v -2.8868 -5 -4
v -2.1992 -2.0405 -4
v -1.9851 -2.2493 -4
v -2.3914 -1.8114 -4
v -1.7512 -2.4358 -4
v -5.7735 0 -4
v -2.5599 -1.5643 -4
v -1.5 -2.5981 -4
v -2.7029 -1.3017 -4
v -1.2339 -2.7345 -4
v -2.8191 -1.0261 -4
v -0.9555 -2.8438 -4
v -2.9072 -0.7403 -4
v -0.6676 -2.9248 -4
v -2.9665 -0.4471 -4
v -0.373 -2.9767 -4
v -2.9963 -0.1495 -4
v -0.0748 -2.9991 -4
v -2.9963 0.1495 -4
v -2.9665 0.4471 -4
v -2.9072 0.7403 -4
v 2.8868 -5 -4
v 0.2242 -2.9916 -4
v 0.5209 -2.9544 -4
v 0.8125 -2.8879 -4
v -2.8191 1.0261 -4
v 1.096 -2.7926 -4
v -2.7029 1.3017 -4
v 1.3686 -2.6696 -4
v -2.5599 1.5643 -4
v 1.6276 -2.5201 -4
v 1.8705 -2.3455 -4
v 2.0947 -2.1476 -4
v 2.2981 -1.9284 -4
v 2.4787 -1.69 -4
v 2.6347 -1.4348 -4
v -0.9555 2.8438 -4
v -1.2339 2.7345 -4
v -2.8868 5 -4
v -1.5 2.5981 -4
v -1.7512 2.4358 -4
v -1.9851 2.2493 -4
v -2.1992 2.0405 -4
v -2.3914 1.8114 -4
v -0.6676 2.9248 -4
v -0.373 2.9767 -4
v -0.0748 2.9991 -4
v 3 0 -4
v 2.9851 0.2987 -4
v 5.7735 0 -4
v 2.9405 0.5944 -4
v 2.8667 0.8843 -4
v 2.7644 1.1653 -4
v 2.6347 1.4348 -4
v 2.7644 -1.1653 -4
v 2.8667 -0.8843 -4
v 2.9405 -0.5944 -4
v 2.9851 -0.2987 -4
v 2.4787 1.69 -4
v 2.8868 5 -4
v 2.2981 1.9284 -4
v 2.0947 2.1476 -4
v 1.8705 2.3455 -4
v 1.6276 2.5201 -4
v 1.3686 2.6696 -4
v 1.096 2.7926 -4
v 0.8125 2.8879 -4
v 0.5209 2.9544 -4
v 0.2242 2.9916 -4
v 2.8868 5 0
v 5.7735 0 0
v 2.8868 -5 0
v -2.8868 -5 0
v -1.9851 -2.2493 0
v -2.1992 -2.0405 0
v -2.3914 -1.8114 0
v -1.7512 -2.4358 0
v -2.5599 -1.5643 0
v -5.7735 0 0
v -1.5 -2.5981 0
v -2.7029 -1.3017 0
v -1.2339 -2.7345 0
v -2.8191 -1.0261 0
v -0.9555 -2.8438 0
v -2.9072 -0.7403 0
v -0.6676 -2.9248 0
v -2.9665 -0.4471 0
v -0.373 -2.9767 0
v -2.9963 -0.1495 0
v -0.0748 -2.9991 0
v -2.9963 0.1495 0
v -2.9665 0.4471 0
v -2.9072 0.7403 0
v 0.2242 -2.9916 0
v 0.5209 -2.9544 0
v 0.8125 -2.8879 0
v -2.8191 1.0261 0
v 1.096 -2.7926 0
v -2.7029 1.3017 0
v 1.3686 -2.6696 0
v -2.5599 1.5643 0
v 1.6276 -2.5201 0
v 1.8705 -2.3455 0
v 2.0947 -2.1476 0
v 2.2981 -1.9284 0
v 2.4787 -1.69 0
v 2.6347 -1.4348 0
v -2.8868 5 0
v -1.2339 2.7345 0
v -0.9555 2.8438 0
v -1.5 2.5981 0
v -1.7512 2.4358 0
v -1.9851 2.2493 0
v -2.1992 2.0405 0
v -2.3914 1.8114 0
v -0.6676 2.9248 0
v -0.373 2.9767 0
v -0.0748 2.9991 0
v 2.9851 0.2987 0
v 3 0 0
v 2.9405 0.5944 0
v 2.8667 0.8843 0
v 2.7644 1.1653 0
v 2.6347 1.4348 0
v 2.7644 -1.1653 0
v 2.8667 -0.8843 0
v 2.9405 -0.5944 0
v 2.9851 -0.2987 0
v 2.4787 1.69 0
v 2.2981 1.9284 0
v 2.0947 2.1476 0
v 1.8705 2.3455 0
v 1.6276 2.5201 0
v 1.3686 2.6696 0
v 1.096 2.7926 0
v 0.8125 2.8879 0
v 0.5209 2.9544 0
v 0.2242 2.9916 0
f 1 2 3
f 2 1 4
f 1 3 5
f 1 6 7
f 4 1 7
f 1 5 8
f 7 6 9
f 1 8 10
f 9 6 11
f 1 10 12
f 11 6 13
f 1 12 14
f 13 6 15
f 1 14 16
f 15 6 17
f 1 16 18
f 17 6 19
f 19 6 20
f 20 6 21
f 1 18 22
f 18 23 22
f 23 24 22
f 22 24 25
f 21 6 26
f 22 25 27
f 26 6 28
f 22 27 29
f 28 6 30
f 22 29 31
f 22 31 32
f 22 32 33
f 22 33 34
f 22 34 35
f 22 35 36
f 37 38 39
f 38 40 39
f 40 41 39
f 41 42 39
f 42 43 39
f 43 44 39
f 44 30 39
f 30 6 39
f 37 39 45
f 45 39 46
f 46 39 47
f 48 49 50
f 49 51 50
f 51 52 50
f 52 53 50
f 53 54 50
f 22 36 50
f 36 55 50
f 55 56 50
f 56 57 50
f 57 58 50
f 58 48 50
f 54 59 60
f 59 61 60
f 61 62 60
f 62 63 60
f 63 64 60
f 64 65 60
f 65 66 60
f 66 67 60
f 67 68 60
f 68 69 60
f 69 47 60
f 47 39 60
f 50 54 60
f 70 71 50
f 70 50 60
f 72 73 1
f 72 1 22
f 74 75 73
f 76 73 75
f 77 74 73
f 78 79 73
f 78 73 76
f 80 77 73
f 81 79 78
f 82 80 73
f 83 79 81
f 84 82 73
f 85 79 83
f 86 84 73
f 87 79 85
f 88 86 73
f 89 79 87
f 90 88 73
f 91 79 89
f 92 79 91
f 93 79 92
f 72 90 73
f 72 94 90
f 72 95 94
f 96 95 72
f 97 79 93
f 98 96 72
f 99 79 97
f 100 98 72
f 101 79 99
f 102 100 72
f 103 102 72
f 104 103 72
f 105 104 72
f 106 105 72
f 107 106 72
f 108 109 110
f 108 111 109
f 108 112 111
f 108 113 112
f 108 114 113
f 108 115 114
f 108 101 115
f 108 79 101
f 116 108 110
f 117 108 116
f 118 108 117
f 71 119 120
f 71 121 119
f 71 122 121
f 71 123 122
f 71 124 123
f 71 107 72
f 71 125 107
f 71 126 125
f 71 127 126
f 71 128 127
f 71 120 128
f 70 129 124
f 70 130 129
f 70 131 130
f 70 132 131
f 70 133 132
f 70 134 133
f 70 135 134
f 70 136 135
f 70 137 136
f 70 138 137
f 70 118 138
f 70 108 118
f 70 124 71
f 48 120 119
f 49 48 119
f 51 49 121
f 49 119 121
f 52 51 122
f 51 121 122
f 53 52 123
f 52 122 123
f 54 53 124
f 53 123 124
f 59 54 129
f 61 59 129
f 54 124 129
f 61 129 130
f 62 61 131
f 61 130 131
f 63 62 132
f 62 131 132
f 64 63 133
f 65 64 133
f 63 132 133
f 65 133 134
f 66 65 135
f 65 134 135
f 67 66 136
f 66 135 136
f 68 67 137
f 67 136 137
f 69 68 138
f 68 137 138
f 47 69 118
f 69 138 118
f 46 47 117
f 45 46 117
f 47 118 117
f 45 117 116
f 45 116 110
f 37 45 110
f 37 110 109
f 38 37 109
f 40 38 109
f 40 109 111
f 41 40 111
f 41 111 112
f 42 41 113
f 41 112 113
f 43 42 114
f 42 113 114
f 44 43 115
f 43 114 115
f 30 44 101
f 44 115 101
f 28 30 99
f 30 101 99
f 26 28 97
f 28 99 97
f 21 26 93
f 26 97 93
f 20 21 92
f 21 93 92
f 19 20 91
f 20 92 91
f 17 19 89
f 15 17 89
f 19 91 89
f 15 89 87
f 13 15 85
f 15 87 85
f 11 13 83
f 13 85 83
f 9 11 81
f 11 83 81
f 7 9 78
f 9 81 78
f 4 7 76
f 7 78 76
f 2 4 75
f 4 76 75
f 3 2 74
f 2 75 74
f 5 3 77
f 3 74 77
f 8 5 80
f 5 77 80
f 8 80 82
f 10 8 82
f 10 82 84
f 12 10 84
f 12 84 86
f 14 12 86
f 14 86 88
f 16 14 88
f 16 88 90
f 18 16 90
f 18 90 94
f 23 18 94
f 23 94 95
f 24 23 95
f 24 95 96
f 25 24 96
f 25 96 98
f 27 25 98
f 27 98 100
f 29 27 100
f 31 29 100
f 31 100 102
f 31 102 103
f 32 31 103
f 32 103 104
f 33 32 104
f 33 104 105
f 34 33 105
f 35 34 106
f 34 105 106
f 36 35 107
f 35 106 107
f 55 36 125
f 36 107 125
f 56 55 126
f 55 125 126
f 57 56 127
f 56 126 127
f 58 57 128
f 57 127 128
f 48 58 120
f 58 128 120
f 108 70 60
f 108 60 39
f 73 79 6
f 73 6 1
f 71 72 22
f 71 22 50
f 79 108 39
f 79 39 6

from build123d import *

# Parameters (mm, degrees)
EXTRUSION1_DEPTH = 4
SKETCH2_R        = 3
THREAD1_DEPTH    = 4


with BuildPart() as part:
    # Sketch1 → Extrusion1 (new body)
    with BuildSketch(Plane.XY):
        Polygon((5.773502692, 0), (2.886751346, 5), (-2.886751346, 5), (-5.773502692, 0), (-2.886751346, -5), (2.886751346, -5), align=None)
    extrude(amount=-EXTRUSION1_DEPTH)

    # Sketch2 → Thread1 (cut)
    with BuildSketch(Plane.XY):
        Circle(SKETCH2_R)
    extrude(amount=-THREAD1_DEPTH, mode=Mode.SUBTRACT)


solid = part.part
